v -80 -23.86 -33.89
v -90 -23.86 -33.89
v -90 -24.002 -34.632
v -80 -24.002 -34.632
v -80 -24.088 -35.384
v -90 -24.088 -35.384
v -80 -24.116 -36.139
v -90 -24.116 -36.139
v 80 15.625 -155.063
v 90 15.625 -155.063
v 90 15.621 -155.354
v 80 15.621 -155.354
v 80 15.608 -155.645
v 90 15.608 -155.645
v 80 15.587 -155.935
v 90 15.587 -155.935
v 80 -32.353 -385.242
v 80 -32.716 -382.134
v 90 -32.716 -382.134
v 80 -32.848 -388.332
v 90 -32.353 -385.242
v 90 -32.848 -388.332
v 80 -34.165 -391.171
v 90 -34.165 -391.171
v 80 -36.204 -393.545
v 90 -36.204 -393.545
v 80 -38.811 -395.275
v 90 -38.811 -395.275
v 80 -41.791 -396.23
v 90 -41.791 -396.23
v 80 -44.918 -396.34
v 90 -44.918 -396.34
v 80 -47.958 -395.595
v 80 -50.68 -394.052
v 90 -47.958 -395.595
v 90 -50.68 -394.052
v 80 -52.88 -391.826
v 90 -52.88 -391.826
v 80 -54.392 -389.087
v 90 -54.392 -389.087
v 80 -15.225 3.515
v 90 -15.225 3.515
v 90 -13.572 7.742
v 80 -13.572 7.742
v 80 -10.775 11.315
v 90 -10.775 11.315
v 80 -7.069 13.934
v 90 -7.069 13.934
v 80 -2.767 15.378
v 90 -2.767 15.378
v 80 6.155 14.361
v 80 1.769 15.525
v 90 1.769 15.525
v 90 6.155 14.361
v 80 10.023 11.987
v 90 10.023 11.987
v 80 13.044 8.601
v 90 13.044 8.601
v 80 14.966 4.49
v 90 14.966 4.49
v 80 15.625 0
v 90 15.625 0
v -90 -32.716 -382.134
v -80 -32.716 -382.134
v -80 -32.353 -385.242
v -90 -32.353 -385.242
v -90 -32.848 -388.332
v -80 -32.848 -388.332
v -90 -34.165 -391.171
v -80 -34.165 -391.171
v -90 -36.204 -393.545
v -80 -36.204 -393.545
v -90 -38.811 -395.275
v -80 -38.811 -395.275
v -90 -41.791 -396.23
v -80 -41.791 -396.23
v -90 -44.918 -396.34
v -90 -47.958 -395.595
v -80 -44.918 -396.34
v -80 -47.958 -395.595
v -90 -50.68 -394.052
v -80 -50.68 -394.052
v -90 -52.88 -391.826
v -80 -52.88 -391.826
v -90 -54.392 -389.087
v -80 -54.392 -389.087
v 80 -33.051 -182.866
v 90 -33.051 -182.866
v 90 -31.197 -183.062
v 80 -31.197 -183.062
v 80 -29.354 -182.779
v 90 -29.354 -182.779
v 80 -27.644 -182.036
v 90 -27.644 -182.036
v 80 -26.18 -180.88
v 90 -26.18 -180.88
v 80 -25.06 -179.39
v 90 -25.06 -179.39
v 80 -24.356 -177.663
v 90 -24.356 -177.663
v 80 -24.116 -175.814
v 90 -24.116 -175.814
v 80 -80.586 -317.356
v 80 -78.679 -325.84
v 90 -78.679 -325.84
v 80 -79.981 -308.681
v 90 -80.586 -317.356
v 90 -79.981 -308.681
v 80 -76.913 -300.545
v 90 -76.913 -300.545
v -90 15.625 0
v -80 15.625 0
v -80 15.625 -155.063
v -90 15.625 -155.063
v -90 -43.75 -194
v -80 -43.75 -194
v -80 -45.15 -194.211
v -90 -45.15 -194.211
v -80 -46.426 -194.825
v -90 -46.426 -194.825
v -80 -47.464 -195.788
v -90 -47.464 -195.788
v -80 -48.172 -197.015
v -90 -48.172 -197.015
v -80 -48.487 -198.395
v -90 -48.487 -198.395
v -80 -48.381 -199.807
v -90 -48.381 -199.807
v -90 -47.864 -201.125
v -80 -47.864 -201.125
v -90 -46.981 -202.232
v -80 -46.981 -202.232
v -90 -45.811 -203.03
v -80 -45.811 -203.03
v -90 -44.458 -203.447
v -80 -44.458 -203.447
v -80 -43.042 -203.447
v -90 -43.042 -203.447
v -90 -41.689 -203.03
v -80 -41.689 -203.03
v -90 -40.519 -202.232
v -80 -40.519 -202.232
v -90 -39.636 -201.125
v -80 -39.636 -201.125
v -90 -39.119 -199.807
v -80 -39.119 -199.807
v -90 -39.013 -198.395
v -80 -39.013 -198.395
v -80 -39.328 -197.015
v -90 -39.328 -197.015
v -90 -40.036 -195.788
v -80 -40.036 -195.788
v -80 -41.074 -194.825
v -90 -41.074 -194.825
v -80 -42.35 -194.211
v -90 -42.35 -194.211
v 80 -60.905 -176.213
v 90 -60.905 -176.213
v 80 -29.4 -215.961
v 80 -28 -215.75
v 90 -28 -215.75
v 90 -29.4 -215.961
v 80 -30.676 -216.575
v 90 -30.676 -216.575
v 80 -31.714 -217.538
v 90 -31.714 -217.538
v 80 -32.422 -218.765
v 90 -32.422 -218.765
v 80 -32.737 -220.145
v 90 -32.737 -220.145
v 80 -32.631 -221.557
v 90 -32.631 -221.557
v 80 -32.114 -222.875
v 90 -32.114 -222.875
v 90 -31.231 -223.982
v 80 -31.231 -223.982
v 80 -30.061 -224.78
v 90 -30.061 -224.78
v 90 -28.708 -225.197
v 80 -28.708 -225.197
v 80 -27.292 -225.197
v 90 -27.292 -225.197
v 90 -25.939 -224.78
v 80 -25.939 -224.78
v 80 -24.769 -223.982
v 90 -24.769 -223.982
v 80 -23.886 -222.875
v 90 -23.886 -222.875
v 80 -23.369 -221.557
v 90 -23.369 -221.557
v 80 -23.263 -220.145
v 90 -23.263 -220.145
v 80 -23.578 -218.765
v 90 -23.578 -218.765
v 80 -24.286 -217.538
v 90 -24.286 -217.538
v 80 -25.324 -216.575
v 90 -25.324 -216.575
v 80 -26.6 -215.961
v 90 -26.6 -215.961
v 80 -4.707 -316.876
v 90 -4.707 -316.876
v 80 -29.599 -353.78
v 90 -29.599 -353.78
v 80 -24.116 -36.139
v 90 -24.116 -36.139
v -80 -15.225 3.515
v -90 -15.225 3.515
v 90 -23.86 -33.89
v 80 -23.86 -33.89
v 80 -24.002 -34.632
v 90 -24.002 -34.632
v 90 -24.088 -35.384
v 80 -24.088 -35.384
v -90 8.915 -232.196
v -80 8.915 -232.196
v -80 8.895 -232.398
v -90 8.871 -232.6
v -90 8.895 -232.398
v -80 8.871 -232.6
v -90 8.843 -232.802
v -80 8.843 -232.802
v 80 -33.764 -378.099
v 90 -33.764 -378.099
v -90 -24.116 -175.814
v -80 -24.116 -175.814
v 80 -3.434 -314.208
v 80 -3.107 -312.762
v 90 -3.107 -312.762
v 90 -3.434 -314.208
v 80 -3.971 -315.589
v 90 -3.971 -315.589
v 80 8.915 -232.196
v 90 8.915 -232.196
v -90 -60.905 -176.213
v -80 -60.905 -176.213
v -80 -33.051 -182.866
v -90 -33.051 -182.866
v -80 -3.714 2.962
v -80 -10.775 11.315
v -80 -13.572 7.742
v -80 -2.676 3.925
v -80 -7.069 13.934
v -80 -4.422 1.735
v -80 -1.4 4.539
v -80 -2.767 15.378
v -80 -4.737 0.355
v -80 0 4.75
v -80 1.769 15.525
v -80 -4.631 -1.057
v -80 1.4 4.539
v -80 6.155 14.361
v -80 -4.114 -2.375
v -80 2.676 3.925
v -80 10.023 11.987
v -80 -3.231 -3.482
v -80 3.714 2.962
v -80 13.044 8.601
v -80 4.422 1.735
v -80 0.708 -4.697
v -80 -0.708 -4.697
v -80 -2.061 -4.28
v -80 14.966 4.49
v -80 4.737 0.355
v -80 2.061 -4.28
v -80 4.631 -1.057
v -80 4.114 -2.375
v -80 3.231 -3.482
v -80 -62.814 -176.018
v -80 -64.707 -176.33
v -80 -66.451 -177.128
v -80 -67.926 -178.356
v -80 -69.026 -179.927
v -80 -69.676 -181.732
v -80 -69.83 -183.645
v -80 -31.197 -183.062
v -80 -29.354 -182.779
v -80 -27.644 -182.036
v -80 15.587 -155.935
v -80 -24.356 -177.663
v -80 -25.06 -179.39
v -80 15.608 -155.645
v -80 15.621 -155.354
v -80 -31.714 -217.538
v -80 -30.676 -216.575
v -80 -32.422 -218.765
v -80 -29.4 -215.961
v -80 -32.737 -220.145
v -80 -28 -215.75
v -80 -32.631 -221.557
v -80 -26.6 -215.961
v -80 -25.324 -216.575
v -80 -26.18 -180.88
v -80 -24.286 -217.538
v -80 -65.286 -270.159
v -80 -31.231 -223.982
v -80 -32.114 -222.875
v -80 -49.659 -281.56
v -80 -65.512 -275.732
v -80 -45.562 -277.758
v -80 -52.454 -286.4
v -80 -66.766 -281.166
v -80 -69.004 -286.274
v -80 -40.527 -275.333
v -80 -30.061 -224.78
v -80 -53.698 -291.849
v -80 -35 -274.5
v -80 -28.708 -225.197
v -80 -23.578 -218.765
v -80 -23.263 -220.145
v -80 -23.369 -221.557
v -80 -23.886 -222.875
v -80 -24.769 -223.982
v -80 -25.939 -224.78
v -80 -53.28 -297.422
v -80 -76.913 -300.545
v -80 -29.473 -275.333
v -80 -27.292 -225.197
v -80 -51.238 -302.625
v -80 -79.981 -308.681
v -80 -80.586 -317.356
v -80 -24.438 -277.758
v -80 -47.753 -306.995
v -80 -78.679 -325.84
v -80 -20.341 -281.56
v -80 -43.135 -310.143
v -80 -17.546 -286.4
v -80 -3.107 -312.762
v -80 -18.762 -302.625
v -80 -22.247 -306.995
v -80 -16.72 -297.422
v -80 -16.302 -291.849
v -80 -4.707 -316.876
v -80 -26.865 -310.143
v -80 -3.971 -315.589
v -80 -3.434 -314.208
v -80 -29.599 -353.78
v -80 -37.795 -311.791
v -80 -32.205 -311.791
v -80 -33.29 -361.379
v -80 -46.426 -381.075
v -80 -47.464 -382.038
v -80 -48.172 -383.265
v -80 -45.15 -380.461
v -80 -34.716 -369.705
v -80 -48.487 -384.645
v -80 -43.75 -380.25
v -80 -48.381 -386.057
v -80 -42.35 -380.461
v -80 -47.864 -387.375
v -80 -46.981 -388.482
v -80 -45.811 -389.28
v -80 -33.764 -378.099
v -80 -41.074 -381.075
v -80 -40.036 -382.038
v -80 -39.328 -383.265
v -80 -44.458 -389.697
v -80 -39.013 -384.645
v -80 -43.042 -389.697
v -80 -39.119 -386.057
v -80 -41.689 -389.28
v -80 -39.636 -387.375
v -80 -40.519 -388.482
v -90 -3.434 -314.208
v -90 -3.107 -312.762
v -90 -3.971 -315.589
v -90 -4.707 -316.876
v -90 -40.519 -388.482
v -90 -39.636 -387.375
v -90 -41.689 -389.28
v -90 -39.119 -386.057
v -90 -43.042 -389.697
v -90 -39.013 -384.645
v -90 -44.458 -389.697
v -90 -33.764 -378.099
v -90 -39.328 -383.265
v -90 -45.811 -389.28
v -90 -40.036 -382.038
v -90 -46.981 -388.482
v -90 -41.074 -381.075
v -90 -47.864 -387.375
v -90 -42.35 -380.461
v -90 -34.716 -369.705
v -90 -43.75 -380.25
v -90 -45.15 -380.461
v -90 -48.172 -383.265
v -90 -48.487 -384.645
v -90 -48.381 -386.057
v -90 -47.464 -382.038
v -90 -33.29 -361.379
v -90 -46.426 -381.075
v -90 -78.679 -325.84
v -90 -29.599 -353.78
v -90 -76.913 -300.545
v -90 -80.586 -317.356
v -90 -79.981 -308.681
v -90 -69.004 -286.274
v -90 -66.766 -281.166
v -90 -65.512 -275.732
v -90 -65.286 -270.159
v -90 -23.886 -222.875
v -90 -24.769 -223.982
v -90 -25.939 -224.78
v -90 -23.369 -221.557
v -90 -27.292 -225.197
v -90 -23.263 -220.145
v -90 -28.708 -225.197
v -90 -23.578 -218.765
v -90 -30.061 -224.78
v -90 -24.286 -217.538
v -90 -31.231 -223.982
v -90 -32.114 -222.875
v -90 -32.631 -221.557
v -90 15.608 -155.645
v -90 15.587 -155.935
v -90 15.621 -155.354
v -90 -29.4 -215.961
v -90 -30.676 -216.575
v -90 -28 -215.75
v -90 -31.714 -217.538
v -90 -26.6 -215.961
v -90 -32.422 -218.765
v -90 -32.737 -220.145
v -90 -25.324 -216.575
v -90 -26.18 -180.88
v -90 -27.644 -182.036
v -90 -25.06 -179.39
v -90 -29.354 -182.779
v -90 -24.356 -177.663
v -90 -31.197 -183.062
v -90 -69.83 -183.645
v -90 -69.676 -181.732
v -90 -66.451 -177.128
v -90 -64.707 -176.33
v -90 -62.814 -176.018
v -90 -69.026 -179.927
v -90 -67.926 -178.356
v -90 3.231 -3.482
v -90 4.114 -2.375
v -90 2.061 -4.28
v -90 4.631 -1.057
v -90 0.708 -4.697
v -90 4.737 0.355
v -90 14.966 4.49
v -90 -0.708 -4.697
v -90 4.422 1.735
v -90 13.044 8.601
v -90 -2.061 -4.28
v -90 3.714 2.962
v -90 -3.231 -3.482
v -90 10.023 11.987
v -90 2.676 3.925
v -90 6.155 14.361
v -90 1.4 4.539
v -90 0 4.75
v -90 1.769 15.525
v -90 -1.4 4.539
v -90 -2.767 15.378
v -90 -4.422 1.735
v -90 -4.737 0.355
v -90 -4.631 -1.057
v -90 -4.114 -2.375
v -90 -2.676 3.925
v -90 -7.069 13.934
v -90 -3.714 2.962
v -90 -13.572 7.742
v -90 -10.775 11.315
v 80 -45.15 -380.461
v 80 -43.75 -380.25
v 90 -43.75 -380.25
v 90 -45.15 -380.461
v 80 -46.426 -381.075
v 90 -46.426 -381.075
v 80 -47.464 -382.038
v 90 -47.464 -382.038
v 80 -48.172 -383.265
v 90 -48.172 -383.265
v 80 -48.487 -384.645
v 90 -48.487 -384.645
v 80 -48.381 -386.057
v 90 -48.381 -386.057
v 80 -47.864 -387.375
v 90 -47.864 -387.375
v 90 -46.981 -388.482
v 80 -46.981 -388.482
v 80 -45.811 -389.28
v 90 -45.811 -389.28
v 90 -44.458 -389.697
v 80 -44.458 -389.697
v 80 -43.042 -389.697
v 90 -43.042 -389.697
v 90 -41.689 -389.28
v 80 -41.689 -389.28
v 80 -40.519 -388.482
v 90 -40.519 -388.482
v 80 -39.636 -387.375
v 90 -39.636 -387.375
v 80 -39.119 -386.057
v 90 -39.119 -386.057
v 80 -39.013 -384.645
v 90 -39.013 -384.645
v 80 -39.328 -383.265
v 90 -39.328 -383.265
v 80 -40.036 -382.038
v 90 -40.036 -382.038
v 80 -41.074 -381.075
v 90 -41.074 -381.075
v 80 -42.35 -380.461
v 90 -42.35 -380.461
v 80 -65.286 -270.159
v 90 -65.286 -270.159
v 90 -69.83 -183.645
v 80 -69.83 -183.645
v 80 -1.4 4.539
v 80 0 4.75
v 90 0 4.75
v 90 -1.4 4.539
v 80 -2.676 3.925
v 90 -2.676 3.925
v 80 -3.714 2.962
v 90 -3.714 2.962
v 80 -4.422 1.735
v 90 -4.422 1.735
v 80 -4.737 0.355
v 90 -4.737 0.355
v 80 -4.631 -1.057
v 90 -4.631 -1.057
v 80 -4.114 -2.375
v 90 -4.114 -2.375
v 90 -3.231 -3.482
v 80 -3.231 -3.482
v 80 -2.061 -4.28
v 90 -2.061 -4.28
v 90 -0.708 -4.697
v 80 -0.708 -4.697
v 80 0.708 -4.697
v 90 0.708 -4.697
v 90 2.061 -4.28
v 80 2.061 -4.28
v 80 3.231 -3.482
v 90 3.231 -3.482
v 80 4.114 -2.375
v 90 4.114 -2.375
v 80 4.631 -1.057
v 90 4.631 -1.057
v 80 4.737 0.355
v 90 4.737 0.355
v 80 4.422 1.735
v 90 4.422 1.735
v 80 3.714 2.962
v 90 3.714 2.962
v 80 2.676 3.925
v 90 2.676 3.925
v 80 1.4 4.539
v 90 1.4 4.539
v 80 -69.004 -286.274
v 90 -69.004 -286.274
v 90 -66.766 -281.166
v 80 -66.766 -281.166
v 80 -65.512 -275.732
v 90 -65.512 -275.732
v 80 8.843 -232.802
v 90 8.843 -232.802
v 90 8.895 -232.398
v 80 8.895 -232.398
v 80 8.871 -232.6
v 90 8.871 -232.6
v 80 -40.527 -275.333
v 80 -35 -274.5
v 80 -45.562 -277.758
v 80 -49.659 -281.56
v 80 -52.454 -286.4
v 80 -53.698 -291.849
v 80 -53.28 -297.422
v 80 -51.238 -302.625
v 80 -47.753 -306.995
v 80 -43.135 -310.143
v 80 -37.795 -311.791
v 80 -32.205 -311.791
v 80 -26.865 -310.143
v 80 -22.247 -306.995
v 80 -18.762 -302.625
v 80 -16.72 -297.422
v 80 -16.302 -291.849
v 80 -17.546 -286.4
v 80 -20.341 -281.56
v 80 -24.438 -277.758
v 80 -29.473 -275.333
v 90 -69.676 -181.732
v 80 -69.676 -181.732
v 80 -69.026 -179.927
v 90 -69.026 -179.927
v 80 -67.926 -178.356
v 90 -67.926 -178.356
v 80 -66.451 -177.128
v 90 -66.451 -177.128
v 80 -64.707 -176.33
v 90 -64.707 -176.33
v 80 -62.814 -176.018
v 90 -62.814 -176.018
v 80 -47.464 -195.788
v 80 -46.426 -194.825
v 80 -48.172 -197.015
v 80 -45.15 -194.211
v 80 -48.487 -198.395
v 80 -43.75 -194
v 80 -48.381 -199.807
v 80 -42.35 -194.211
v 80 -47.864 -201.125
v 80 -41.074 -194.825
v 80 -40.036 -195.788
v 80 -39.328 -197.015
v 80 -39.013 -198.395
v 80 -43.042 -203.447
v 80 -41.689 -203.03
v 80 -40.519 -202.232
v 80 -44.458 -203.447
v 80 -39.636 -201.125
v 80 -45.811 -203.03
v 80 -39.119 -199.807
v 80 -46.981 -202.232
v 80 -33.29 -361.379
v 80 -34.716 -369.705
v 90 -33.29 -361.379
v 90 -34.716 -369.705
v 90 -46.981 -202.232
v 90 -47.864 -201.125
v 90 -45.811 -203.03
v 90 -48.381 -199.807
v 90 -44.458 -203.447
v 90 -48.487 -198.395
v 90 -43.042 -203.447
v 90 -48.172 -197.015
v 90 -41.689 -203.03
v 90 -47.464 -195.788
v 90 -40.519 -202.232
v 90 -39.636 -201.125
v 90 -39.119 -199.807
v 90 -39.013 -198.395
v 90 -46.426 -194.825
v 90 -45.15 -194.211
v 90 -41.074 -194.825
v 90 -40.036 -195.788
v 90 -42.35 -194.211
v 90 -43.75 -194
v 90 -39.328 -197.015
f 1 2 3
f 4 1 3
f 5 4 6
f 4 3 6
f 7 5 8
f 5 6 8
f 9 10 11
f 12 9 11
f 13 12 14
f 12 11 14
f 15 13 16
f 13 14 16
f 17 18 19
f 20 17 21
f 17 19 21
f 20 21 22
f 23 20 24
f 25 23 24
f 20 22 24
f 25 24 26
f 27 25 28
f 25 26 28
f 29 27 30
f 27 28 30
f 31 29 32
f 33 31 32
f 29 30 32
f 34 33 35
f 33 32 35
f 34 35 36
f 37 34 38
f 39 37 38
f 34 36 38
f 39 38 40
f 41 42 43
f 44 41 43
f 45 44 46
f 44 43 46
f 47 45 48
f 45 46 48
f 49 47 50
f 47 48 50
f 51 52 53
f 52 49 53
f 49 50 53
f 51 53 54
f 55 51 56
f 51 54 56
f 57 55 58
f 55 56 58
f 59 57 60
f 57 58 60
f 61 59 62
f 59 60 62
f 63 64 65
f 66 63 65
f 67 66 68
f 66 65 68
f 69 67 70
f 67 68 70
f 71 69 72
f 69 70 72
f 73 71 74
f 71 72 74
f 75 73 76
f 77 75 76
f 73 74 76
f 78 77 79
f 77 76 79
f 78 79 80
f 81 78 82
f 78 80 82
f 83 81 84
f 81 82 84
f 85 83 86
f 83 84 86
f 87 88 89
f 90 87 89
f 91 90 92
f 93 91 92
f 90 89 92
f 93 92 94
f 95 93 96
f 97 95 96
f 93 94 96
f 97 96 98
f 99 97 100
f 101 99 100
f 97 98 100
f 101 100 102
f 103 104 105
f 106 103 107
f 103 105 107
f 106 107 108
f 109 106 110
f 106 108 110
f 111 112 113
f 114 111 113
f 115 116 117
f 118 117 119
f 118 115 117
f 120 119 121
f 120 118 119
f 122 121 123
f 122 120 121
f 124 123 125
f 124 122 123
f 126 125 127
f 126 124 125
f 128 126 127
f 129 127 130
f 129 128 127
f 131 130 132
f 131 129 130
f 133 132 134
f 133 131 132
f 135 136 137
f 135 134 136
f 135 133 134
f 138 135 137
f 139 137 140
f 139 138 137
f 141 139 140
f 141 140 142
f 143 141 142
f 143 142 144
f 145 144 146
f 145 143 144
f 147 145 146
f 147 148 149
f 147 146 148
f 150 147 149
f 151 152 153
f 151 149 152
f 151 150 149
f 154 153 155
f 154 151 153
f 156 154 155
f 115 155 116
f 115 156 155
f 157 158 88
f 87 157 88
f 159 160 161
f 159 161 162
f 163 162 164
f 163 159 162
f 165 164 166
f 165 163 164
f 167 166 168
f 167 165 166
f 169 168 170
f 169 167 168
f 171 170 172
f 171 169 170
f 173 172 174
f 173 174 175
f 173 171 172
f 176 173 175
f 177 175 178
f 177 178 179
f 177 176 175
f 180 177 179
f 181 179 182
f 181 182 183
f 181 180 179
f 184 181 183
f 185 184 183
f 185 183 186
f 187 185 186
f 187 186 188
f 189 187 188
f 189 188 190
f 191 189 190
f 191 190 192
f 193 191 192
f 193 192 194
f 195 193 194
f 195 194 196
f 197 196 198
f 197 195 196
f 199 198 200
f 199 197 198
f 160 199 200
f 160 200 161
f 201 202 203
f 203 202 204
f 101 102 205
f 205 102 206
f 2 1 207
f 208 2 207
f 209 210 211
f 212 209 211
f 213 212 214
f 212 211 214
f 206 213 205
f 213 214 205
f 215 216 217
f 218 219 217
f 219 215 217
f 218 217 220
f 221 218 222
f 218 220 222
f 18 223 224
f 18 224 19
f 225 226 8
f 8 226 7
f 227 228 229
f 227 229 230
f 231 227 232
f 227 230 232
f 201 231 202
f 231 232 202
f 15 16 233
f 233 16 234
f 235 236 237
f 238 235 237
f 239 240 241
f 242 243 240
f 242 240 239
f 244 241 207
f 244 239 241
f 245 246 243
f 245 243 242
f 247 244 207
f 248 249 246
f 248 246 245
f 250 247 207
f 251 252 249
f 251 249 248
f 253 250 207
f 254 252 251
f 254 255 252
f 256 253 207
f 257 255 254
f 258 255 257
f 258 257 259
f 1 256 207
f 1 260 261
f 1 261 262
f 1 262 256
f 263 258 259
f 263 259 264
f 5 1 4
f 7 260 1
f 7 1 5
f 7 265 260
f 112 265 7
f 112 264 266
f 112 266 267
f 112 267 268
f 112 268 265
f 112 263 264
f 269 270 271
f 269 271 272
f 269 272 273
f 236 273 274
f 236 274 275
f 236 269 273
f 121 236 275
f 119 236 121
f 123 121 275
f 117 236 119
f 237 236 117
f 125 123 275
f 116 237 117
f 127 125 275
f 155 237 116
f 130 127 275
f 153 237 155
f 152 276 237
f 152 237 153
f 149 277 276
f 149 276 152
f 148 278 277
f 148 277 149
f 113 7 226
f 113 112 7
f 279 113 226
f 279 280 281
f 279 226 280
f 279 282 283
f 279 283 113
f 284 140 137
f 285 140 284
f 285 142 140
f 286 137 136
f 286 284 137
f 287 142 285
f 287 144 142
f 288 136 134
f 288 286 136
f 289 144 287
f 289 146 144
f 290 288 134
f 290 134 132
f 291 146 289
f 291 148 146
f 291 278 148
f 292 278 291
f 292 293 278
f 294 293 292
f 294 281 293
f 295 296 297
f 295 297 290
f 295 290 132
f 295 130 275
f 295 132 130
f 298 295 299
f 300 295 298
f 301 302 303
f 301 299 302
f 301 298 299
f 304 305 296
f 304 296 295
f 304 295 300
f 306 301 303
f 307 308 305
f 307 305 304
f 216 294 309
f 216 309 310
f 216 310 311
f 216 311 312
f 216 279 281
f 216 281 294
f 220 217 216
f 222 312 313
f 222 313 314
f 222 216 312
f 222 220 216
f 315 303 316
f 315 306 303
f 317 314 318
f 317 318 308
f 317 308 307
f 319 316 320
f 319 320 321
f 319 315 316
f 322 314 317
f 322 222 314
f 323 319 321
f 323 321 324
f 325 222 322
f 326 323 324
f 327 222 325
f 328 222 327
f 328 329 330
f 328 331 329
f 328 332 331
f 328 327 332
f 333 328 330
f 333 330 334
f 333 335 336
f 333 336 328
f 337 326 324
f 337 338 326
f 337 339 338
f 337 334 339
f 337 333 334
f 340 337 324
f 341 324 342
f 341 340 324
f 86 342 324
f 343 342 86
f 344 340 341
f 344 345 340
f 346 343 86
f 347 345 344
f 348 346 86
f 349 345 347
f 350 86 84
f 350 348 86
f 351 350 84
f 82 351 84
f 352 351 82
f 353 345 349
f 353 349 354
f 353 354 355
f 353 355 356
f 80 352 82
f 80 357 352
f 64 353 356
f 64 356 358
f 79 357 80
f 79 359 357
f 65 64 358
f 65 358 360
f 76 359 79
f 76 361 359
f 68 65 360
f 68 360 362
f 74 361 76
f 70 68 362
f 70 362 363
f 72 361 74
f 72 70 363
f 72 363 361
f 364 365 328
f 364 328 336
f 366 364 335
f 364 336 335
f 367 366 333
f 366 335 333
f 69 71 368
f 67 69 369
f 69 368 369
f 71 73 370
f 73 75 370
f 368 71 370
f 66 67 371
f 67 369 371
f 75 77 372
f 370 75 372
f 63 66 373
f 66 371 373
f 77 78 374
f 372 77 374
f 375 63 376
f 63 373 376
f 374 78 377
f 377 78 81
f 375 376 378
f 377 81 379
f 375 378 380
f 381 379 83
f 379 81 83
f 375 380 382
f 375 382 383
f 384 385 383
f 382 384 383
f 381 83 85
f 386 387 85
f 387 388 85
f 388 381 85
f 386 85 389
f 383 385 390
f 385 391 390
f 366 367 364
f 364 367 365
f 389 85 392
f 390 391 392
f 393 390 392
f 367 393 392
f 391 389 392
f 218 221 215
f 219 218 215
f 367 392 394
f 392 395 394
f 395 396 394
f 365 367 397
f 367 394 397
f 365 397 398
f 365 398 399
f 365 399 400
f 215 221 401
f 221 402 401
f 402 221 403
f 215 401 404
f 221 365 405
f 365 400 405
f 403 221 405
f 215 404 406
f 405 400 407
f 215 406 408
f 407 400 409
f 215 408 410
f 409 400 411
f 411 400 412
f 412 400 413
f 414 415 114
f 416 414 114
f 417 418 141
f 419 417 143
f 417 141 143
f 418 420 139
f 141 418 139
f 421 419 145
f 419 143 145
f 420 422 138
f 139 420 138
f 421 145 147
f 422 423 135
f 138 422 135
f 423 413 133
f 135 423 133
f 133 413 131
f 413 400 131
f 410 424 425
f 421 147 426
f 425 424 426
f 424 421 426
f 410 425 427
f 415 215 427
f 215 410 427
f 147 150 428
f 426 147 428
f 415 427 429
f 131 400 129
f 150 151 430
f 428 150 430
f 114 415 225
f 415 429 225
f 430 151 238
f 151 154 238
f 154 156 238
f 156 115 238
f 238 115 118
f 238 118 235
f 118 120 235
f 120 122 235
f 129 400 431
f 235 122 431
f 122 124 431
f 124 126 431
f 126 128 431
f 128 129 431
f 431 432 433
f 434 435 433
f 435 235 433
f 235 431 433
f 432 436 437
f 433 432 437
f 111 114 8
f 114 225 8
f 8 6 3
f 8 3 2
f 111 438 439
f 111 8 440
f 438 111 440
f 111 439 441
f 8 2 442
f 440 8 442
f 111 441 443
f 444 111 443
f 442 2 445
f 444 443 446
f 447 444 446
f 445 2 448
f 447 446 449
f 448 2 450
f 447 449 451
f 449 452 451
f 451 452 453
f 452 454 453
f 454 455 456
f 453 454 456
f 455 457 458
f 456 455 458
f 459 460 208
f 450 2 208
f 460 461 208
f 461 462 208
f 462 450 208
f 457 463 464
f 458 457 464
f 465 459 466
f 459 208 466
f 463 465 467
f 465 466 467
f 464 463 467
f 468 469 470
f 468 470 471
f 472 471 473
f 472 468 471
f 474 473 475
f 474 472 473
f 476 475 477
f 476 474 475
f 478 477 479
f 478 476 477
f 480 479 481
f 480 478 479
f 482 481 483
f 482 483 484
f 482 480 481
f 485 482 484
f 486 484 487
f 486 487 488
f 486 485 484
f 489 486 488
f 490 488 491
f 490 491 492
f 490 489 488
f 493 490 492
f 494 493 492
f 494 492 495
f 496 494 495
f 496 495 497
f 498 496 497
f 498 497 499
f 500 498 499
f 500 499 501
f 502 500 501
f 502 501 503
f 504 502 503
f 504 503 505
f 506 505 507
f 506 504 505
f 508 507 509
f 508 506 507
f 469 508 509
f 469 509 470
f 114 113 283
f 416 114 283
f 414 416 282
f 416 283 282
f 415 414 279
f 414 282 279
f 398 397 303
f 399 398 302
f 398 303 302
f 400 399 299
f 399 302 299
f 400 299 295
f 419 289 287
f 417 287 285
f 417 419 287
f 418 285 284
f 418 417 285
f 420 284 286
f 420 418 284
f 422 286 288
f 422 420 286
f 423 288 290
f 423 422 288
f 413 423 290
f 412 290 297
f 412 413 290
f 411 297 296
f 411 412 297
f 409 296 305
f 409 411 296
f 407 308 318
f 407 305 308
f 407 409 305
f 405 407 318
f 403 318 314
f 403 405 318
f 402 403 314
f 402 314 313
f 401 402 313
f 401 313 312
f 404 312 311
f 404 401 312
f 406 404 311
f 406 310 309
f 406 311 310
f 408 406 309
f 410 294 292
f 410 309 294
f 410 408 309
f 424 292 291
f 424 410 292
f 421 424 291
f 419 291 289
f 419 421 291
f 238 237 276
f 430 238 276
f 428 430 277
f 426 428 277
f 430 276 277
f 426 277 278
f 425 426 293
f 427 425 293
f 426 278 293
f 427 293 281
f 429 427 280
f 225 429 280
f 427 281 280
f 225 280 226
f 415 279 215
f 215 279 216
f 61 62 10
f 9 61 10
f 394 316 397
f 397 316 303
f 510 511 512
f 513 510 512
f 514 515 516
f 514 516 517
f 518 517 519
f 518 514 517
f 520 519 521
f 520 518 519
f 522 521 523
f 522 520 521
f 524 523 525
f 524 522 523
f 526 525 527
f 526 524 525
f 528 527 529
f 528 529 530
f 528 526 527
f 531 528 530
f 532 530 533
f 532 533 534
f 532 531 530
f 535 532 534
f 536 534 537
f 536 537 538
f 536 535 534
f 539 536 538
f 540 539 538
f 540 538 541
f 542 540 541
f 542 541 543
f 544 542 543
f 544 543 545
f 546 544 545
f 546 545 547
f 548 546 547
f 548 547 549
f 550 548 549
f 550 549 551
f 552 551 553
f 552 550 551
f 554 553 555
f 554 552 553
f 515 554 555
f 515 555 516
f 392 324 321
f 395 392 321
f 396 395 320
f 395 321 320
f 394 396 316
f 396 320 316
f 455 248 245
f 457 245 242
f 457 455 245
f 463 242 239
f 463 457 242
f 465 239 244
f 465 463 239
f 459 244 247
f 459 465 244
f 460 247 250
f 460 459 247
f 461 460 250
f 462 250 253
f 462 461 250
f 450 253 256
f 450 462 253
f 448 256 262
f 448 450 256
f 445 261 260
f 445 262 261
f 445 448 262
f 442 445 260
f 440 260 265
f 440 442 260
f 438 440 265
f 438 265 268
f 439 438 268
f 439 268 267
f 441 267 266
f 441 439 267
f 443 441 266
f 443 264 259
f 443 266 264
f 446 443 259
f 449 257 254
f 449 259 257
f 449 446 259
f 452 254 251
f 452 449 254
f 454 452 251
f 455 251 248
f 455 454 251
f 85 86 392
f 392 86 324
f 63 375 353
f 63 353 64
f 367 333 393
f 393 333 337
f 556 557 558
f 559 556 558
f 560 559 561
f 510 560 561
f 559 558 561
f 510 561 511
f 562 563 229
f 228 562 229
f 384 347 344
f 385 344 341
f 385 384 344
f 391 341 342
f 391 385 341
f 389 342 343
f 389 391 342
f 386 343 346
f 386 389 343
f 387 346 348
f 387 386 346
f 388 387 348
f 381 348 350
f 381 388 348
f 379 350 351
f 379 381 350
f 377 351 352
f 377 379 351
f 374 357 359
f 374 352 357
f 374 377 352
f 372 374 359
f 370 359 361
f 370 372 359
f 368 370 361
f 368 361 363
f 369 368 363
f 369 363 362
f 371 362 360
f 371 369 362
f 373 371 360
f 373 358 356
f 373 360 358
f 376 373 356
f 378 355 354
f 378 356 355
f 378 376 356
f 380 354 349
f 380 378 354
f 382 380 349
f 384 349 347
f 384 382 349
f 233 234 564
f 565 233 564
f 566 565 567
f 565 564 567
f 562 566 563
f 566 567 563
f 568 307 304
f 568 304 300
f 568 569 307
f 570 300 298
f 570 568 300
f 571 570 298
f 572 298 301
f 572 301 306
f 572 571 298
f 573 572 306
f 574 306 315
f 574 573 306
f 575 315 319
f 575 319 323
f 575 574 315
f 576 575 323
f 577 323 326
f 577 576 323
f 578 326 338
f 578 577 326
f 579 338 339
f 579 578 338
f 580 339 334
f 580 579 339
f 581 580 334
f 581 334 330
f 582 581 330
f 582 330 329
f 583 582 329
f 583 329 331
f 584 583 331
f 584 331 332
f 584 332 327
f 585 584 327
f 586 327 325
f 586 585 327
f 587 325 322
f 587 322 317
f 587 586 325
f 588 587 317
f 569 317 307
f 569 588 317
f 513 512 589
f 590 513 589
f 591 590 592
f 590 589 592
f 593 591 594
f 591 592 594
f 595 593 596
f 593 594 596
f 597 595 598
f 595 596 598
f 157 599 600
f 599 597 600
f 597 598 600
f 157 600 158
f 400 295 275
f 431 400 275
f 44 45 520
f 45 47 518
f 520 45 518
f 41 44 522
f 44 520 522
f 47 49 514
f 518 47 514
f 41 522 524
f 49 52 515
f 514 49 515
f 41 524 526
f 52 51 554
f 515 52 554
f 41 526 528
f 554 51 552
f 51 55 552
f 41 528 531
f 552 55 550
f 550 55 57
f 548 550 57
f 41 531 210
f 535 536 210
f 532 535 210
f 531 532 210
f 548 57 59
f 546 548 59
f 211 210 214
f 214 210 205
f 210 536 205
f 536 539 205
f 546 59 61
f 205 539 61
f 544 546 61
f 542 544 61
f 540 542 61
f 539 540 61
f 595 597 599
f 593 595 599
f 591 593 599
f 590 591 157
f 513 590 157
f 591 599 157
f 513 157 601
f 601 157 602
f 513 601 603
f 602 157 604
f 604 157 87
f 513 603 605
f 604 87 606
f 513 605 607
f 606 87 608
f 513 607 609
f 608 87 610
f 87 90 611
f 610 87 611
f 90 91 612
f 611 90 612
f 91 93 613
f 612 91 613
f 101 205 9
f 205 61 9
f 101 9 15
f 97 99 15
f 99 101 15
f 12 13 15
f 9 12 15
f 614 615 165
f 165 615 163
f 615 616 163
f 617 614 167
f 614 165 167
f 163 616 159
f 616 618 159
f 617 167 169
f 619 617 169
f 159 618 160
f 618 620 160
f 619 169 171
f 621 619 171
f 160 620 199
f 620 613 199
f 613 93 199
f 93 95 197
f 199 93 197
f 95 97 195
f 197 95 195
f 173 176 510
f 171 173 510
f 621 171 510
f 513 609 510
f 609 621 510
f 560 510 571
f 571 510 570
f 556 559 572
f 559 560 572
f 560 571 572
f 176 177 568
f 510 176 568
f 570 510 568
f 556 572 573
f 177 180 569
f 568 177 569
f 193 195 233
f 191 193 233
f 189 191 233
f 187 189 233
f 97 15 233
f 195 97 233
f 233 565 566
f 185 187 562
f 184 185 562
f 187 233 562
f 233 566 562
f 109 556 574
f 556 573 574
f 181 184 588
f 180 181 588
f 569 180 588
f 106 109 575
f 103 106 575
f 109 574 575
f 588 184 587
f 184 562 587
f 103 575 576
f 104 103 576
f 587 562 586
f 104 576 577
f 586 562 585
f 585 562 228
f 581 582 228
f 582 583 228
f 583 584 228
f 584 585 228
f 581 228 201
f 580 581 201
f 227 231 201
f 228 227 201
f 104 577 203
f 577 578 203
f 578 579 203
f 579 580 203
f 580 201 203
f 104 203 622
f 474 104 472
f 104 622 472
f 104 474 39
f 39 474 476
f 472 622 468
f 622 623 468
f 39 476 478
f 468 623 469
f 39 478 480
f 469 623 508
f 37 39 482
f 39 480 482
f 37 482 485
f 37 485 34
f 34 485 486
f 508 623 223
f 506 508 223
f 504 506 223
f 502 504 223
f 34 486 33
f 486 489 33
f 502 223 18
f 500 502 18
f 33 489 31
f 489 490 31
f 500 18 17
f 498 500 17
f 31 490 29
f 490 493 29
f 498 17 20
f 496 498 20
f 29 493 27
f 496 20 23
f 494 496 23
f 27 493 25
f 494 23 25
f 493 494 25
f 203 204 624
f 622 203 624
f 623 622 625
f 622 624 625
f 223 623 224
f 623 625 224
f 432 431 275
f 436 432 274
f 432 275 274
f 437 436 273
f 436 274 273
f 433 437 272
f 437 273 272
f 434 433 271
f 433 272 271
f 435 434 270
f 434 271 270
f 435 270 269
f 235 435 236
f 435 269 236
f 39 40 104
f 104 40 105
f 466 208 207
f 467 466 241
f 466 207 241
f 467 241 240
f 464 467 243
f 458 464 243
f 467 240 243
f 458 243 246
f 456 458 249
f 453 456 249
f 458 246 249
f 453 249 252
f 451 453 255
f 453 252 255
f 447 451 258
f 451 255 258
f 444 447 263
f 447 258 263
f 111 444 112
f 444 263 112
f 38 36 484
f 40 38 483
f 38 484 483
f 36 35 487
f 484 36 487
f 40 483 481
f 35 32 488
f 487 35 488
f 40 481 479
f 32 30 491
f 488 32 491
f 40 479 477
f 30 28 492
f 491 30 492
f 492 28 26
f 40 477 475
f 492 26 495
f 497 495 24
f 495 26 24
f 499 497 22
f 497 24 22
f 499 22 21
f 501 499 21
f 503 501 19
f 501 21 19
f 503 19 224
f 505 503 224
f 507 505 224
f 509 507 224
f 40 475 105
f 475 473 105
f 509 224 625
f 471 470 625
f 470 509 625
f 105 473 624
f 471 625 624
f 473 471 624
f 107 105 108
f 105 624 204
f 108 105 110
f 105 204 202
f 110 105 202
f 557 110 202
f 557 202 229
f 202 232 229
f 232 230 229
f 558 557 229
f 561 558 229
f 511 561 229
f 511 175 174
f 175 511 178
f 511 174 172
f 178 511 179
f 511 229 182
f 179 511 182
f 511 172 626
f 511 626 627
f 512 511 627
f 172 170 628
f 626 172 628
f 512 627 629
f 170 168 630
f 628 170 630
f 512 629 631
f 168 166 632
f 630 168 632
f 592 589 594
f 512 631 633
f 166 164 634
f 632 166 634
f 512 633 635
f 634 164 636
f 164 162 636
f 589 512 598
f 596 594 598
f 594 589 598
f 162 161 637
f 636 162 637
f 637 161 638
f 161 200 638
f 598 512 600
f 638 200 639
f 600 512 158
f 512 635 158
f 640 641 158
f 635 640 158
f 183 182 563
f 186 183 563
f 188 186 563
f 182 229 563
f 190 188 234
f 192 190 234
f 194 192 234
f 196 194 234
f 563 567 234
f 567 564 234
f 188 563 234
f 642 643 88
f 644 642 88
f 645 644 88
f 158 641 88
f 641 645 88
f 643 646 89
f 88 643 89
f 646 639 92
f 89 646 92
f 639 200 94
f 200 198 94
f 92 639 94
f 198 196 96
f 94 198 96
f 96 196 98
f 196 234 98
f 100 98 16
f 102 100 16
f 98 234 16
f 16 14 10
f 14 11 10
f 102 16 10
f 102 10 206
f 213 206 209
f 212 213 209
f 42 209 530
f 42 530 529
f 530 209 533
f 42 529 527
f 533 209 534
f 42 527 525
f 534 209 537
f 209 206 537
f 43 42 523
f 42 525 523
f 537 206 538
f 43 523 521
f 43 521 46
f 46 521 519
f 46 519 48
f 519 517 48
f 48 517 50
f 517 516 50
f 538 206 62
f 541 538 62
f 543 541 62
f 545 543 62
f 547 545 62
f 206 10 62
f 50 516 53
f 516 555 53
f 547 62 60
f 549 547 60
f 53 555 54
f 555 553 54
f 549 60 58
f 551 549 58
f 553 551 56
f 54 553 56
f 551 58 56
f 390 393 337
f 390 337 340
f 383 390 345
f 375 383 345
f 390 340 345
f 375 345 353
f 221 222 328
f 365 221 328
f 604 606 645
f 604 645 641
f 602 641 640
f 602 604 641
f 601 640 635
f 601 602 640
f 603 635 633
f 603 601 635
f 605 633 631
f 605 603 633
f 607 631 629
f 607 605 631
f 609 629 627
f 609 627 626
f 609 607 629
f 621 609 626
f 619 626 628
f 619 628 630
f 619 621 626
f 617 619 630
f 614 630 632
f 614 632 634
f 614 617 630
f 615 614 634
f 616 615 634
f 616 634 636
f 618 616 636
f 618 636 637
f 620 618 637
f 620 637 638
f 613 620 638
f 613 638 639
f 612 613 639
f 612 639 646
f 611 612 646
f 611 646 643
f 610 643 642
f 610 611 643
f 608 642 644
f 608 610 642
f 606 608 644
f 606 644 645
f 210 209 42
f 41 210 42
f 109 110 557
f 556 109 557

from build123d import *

# Parameters (mm, degrees)
SKETCH1_R           = 4.75
BOSS_EXTRUDE1_DEPTH = 90
FILLET1_R           = 10
SKETCH4_W           = 160
SKETCH4_H           = 412.025
CUT_EXTRUDE2_DEPTH  = 418.739316622
SKETCH5_R           = 18.75
BOSS_EXTRUDE3_DEPTH = 90


with BuildPart() as part:
    # Sketch1 → Boss-Extrude1 (new, symmetric)
    with BuildSketch(Plane(origin=(0, 0, 0), x_dir=(0, 0, -1), z_dir=(1, 0, 0))):
        with BuildLine():
            Line((0, 15.625), (155.5, 15.625))
            Line((155.5, 15.625), (232.5, 8.888372909))
            Line((232.5, 8.888372909), (315, -3.441334703))
            Line((315, -3.441334703), (353.780445284, -29.599075334))
            ThreePointArc((353.780445284, -29.599075334), (365.491486019, -34.297330028), (378.098548324, -33.764364436))
            Line((378.098548324, -33.764364436), (382.133919944, -32.716161814))
            ThreePointArc((382.133919944, -32.716161814), (395.855263955, -40.268155018), (389.086597054, -54.392355215))
            Line((389.086597054, -54.392355215), (325.840301311, -78.678532537))
            ThreePointArc((325.840301311, -78.678532537), (312.996785566, -80.599492359), (300.544774533, -76.912568905))
            Line((300.544774533, -76.912568905), (286.274266107, -69.004404506))
            ThreePointArc((286.274266107, -69.004404506), (278.478171078, -66.012774583), (270.159478586, -65.285930348))
            Line((270.159478586, -65.285930348), (183.644750078, -69.829776728))
            ThreePointArc((183.644750078, -69.829776728), (177.69334539, -67.229235713), (176.212855636, -60.905456668))
            Line((176.212855636, -60.905456668), (182.866024409, -33.050687222))
            ThreePointArc((182.866024409, -33.050687222), (181.505326746, -26.874655225), (175.81438365, -24.116388374))
            Line((175.81438365, -24.116388374), (35, -24.116388374))
            Line((35, -24.116388374), (-3.514860224, -15.224532262))
            ThreePointArc((-3.514860224, -15.224532262), (-15.524560245, 1.768800215), (0, 15.625))
        make_face()
        with Locations(Location((0, 0, 0), (0, 0, 180))):
            Circle(SKETCH1_R, mode=Mode.SUBTRACT)
        with Locations(Location((198.75, -43.75, 0), (0, 0, 180))):
            Circle(SKETCH1_R, mode=Mode.SUBTRACT)
        with Locations(Location((220.5, -28, 0), (0, 0, 180))):
            Circle(SKETCH1_R, mode=Mode.SUBTRACT)
        with Locations(Location((385, -43.75, 0), (0, 0, 180))):
            Circle(SKETCH1_R, mode=Mode.SUBTRACT)
    extrude(amount=BOSS_EXTRUDE1_DEPTH, both=True)

    # Fillet1
    # the kernel refuses this fillet: 10 mm, written as the material it takes off along each edge
    with BuildSketch(Plane(origin=(91.091523573, 15.625, -155.5), x_dir=(0, 0, 1), z_dir=(-1, 0, 0))) as fillet1_piece_1:
        with BuildLine():
            CenterArc((FILLET1_R * 0.0436609429085, -FILLET1_R), FILLET1_R, 90, 5)
            Line((-FILLET1_R * 0.0434947998391, -FILLET1_R * 0.00380530190825), (0, 0))
            Line((0, 0), (FILLET1_R * 0.0436609429085, 0))
        make_face()
    extrude(amount=182.183047145, mode=Mode.SUBTRACT)
    with BuildSketch(Plane(origin=(90.763819082, 8.888372909, -232.5), x_dir=(0, -0.14780941112960186, -0.989015863361918), z_dir=(-1, 0, 0))) as fillet1_piece_2:
        with BuildLine():
            CenterArc((FILLET1_R * 0.0305527632986, FILLET1_R), FILLET1_R, 266.5, 3.5)
            Line((-FILLET1_R * 0.0304957762363, FILLET1_R * 0.00186520157813), (0, 0))
            Line((0, 0), (FILLET1_R * 0.0305527632986, 0))
        make_face()
    extrude(amount=181.527638165, mode=Mode.SUBTRACT)
    with BuildSketch(Plane(origin=(95.656922456, -3.441334703, -315), x_dir=(0, -0.5591929034707496, -0.8290375725550397), z_dir=(-1, 0, 0))) as fillet1_piece_3:
        with BuildLine():
            CenterArc((FILLET1_R * 0.226276898255, FILLET1_R), FILLET1_R, 244.5, 25.5)
            Line((-FILLET1_R * 0.204234198553, FILLET1_R * 0.0974147156501), (0, 0))
            Line((0, 0), (FILLET1_R * 0.226276898255, 0))
        make_face()
    extrude(amount=191.313844913, mode=Mode.SUBTRACT)
    with BuildSketch(Plane(origin=(-92.848390208, -24.116388374, -35), x_dir=(0, 0.2249510543438657, 0.9743700647852351), z_dir=(1, 0, 0))) as fillet1_piece_4:
        with BuildLine():
            CenterArc((FILLET1_R * 0.113935608302, -FILLET1_R), FILLET1_R, 90, 13)
            Line((-FILLET1_R * 0.111015446042, -FILLET1_R * 0.0256299352148), (0, 0))
            Line((0, 0), (FILLET1_R * 0.113935608302, 0))
        make_face()
    extrude(amount=185.696780415, mode=Mode.SUBTRACT)

    # Sketch4 → Cut-Extrude2 (cut, through all)
    with BuildSketch(Plane(origin=(0, 15.625, 0), x_dir=(1, 0, 0), z_dir=(0, 1, 0))):
        with Locations((0, 190.3875)):
            Rectangle(SKETCH4_W, SKETCH4_H)
    extrude(amount=-CUT_EXTRUDE2_DEPTH, mode=Mode.SUBTRACT)


with BuildPart() as cut_extrude2_piece_1:
    # of the separate pieces the step leaves, piece 1, a body of its own (cut_extrude2_pieces)
    add(part.part.solids().sort_by_distance((80, 15.625, 0))[0])



with BuildPart() as cut_extrude2_piece_2:
    # of the separate pieces the step leaves, piece 2, a body of its own (cut_extrude2_pieces)
    add(part.part.solids().sort_by_distance((-90, 15.625, 0))[0])


with BuildPart() as cut_extrude2_piece_1_1:
    add(cut_extrude2_piece_1.part)

    add(cut_extrude2_piece_2.part)  # Boss-Extrude3 merges Cut-Extrude2 piece 2
    # Sketch5 → Boss-Extrude3 (add, symmetric)
    with BuildSketch(Plane(origin=(0, 0, 0), x_dir=(0, 0, -1), z_dir=(1, 0, 0))):
        with Locations(Location((293.25, -35, 0), (0, 0, 180))):
            Circle(SKETCH5_R)
    extrude(amount=BOSS_EXTRUDE3_DEPTH, both=True)


solid = cut_extrude2_piece_1_1.part
